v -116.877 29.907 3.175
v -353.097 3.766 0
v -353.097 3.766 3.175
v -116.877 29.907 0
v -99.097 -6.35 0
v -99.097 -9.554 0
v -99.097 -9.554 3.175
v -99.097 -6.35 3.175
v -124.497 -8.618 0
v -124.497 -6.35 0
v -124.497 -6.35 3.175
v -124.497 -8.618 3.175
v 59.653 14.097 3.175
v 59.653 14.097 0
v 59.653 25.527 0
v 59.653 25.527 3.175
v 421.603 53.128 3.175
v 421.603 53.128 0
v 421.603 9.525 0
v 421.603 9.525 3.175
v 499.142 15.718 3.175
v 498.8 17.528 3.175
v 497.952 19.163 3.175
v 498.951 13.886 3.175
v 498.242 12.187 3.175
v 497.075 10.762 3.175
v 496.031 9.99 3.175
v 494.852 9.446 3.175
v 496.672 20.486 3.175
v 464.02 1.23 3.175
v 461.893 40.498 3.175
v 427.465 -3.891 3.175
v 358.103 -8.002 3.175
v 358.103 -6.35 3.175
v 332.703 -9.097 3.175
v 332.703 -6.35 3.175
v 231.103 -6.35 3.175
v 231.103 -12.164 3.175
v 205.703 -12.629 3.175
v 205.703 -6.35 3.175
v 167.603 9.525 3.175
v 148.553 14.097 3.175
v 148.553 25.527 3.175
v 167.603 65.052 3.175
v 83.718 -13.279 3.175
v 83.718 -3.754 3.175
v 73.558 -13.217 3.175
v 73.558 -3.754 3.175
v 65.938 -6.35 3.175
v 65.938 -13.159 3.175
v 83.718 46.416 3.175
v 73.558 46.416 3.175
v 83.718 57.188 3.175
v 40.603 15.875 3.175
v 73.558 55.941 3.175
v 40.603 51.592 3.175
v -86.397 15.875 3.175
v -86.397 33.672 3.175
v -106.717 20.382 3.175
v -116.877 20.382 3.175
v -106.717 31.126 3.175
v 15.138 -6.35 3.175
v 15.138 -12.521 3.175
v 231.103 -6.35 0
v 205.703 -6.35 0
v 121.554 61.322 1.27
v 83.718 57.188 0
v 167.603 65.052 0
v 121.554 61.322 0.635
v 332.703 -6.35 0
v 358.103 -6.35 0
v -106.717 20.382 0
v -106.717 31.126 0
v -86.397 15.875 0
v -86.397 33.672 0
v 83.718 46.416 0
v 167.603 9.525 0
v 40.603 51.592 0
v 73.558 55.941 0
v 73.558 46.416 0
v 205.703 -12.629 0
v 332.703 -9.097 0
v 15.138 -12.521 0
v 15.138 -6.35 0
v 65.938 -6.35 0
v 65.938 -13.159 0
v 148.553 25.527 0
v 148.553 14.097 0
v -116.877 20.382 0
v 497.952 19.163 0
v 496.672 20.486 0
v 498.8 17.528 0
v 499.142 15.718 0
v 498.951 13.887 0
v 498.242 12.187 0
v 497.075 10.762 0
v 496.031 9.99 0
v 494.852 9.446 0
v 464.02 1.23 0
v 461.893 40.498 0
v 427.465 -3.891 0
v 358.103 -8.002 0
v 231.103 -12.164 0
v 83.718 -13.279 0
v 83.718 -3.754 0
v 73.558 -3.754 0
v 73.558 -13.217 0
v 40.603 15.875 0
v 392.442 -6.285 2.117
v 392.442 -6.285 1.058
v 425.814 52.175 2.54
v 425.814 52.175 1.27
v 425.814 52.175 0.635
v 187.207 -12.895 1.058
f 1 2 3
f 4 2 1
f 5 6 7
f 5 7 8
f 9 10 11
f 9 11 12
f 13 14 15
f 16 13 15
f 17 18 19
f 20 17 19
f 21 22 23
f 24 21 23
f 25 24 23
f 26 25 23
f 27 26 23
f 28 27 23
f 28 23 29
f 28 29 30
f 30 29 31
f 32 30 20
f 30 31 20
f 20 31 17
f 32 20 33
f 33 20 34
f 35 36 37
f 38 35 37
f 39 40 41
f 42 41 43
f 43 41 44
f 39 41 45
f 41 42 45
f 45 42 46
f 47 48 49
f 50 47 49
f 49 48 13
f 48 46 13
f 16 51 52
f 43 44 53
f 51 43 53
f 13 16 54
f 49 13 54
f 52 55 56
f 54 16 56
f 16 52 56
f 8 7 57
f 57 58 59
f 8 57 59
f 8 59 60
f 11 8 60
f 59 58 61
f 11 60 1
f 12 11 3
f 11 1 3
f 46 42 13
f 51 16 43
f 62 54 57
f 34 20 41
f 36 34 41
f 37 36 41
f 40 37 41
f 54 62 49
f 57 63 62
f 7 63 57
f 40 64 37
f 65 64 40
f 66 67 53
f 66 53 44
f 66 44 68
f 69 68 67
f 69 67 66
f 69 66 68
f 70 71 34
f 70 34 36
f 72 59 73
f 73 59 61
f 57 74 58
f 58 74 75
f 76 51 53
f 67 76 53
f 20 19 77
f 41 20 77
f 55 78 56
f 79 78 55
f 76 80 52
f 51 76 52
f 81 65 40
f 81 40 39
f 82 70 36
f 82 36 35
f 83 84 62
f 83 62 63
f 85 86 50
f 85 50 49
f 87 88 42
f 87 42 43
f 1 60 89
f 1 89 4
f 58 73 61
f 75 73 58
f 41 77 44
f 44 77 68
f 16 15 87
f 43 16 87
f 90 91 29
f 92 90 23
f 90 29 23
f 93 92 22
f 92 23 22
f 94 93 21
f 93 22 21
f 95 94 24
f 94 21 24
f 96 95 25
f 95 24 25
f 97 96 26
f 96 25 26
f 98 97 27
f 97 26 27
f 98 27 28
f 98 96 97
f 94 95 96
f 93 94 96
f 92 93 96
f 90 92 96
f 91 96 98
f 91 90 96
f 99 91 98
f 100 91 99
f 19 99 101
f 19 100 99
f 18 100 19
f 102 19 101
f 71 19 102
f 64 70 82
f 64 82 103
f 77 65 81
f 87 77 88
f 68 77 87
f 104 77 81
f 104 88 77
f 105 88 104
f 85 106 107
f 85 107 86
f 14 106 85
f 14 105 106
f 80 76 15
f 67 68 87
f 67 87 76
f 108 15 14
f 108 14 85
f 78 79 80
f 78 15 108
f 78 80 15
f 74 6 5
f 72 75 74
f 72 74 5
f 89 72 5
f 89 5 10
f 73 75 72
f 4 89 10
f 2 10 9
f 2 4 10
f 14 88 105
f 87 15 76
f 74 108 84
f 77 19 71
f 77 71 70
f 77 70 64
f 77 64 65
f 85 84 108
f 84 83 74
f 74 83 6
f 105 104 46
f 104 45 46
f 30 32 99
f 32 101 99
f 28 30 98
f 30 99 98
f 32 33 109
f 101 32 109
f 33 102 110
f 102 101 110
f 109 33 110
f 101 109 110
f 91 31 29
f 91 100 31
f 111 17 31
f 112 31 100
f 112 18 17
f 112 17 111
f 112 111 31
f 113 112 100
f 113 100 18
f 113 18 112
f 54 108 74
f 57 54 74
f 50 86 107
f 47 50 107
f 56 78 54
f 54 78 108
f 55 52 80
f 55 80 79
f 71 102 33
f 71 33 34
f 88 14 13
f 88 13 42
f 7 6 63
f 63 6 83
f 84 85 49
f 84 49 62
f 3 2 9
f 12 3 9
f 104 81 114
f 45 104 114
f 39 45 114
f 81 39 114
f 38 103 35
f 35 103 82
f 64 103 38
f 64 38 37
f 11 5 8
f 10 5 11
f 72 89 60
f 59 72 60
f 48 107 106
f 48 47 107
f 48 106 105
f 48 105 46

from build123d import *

# Parameters (mm, degrees)
BOSS_EXTRUDE1_DEPTH   = 3.175
FILLET1_R             = 6.35
CUT_EXTRUDE5_REACH    = 505.743
SKETCH5_W             = 88.9
SKETCH5_H             = 11.43
CUT_EXTRUDE3_DEPTH    = 5.08
CUT_EXTRUDE6_REACH    = 505.743
CUT_EXTRUDE4_DEPTH    = 5.08
CAVITY1_START         = -116.877115344
CAVITY1_OUTLINE_W     = 26.033160117
CAVITY1_OUTLINE_H     = 6
CAVITY1_DEPTH         = 10.16
CAVITY1_START_2       = 73.557724966
CAVITY1_2_OUTLINE_W   = 11.245727141
CAVITY1_2_OUTLINE_H   = 6
CAVITY1_2_OUTLINE_W_2 = 12.584380536
CAVITY1_2_DEPTH       = 10.16


# Read off the part's stored shape, not the designer's step: Cavity1
with BuildPart() as part:
    # Sketch1 → Boss-Extrude1 (new body)
    with BuildSketch(Plane.XY):
        with BuildLine():
            add(Edge.make_bspline(
                [(-353.097115344, 3.76640622), (-263.60988857, 15.489732087), (-103.405625954, 27.702523148), (139.625383809, 69.731889132), (320.600909148, 70.897971745), (447.029350736, 49.156772515), (484.461992977, 32.39779841), (505.225432444, 13.29140622)],
                knots=[0, 0, 0, 0, 0.308401543, 0.542913332, 0.850169973, 0.887176211, 1, 1, 1, 1], degree=3))
            add(Edge.make_bspline(
                [(-353.097115344, 3.76640622), (-171.204173065, -8.622681299), (70.681231732, -17.726989966), (367.634485174, -8.589262826), (467.934967897, -1.634661846), (505.225432444, 13.29140622)],
                knots=[0, 0, 0, 0, 0.625313044, 0.861778666, 1, 1, 1, 1], degree=3))
        make_face()
    extrude(amount=BOSS_EXTRUDE1_DEPTH)

    # Fillet1
    fillet1_edges = [part.edges().sort_by_distance(p)[0] for p in [
        (505.225432444, 13.29140622, 1.5875),
    ]]
    fillet(fillet1_edges, radius=FILLET1_R)

    # Sketch7 → Cut-Extrude5 (cut, up to next)
    with BuildSketch(Plane(origin=(0, 0, 0), x_dir=(-1, 0, 0), z_dir=(0, 0, -1)), mode=Mode.PRIVATE) as cut_extrude5_sk1:
        with BuildLine():
            Line((-358.102884656, -6.35), (-332.702884656, -6.35))
            Line((-332.702884656, -6.35), (-332.702884656, -9.096739879))
            add(Edge.make_bspline(
                [(-332.702884656, -9.096739879), (-341.216325131, -8.753253809), (-349.686543734, -8.388301604), (-358.102884656, -8.001631902)],
                knots=[0.79148957, 0.79148957, 0.79148957, 0.79148957, 0.821107867, 0.821107867, 0.821107867, 0.821107867], degree=3))
            Line((-358.102884656, -8.001631902), (-358.102884656, -6.35))
        make_face()
    cut_extrude5_tool1 = extrude(cut_extrude5_sk1.sketch, amount=-CUT_EXTRUDE5_REACH, mode=Mode.PRIVATE) & part.part
    # Sketch7 → Cut-Extrude5 (cut, up to next)
    with BuildSketch(Plane(origin=(0, 0, 0), x_dir=(-1, 0, 0), z_dir=(0, 0, -1)), mode=Mode.PRIVATE) as cut_extrude5_sk2:
        with BuildLine():
            Line((-231.102884656, -6.35), (-205.702884656, -6.35))
            Line((-205.702884656, -6.35), (-205.702884656, -12.629236372))
            add(Edge.make_bspline(
                [(-205.702884656, -12.629236372), (-214.16430095, -12.49359489), (-222.634256581, -12.338730353), (-231.102884656, -12.164410009)],
                knots=[0.646368105, 0.646368105, 0.646368105, 0.646368105, 0.675236637, 0.675236637, 0.675236637, 0.675236637], degree=3))
            Line((-231.102884656, -12.164410009), (-231.102884656, -6.35))
        make_face()
    cut_extrude5_tool2 = extrude(cut_extrude5_sk2.sketch, amount=-CUT_EXTRUDE5_REACH, mode=Mode.PRIVATE) & part.part
    # Sketch7 → Cut-Extrude5 (cut, up to next)
    with BuildSketch(Plane(origin=(0, 0, 0), x_dir=(-1, 0, 0), z_dir=(0, 0, -1)), mode=Mode.PRIVATE) as cut_extrude5_sk3:
        with BuildLine():
            Line((-65.93772502, -6.35), (-15.13772502, -6.35))
            Line((-15.13772502, -6.35), (-15.13772502, -12.521395898))
            add(Edge.make_bspline(
                [(-15.13772502, -12.521395898), (-32.040463908, -12.805124192), (-48.969973263, -13.018530998), (-65.93772502, -13.158984983)],
                knots=[0.427180219, 0.427180219, 0.427180219, 0.427180219, 0.48603051, 0.48603051, 0.48603051, 0.48603051], degree=3))
            Line((-65.93772502, -13.158984983), (-65.93772502, -6.35))
        make_face()
    cut_extrude5_tool3 = extrude(cut_extrude5_sk3.sketch, amount=-CUT_EXTRUDE5_REACH, mode=Mode.PRIVATE) & part.part
    # Sketch7 → Cut-Extrude5 (cut, up to next)
    with BuildSketch(Plane(origin=(0, 0, 0), x_dir=(-1, 0, 0), z_dir=(0, 0, -1)), mode=Mode.PRIVATE) as cut_extrude5_sk4:
        with BuildLine():
            Line((99.097115344, -6.35), (124.497115344, -6.35))
            Line((124.497115344, -6.35), (124.497115344, -8.618440951))
            add(Edge.make_bspline(
                [(124.497115344, -8.618440951), (116.029695194, -8.946223445), (107.563514441, -9.25806826), (99.097115344, -9.553641032)],
                knots=[0.264694306, 0.264694306, 0.264694306, 0.264694306, 0.294281016, 0.294281016, 0.294281016, 0.294281016], degree=3))
            Line((99.097115344, -9.553641032), (99.097115344, -6.35))
        make_face()
    cut_extrude5_tool4 = extrude(cut_extrude5_sk4.sketch, amount=-CUT_EXTRUDE5_REACH, mode=Mode.PRIVATE) & part.part
    add(cut_extrude5_tool1.solids().sort_by_distance((344.35466, -7.478114, 0))[0], mode=Mode.SUBTRACT)
    add(cut_extrude5_tool2.solids().sort_by_distance((218.240446, -9.379718, 0))[0], mode=Mode.SUBTRACT)
    add(cut_extrude5_tool3.solids().sort_by_distance((40.951434, -9.615723, 0))[0], mode=Mode.SUBTRACT)
    add(cut_extrude5_tool4.solids().sort_by_distance((-111.075712, -7.735326, 0))[0], mode=Mode.SUBTRACT)

    # Sketch5 → Cut-Extrude3 (cut)
    with BuildSketch(Plane.XY):
        with Locations((104.102884656, 19.812)):
            Rectangle(SKETCH5_W, SKETCH5_H)
    extrude(amount=CUT_EXTRUDE3_DEPTH, mode=Mode.SUBTRACT)

    # Sketch8 → Cut-Extrude6 (cut, up to next)
    with BuildSketch(Plane(origin=(0, 0, 0), x_dir=(-1, 0, 0), z_dir=(0, 0, -1)), mode=Mode.PRIVATE) as cut_extrude6_sk1:
        with BuildLine():
            Line((-421.602884656, 53.128136288), (-421.602884656, 9.525))
            Line((-421.602884656, 9.525), (-167.602884656, 9.525))
            Line((-167.602884656, 9.525), (-167.602884656, 65.051503813))
            add(Edge.make_bspline(
                [(-167.602884656, 65.051503813), (-244.722722107, 70.03272949), (-333.181087562, 68.488590043), (-412.953469478, 55.01226242), (-421.602884656, 53.128136288)],
                knots=[0.594152543, 0.594152543, 0.594152543, 0.594152543, 0.850169973, 0.88199459, 0.88199459, 0.88199459, 0.88199459], degree=3))
        make_face()
    cut_extrude6_tool1 = extrude(cut_extrude6_sk1.sketch, amount=-CUT_EXTRUDE6_REACH, mode=Mode.PRIVATE) & part.part
    add(cut_extrude6_tool1.solids().sort_by_distance((290.394323, 37.11831, 0))[0], mode=Mode.SUBTRACT)

    # Sketch6 → Cut-Extrude4 (cut)
    with BuildSketch(Plane.XY):
        with BuildLine():
            Line((40.602884656, 51.591569772), (40.602884656, 15.875))
            Line((40.602884656, 15.875), (-86.397115344, 15.875))
            Line((-86.397115344, 15.875), (-86.397115344, 33.671872302))
            add(Edge.make_bspline(
                [(-86.397115344, 33.671872302), (-85.336997309, 33.80875443), (-42.923565209, 39.312219047), (-0.873657075, 45.877823306), (40.602884656, 51.591569772)],
                knots=[0.304745552, 0.304745552, 0.304745552, 0.304745552, 0.308401543, 0.451045815, 0.451045815, 0.451045815, 0.451045815], degree=3))
        make_face()
    extrude(amount=CUT_EXTRUDE4_DEPTH, mode=Mode.SUBTRACT)

    # Cavity1 outline → Cavity1 (cut)
    with BuildSketch(Plane.YZ.offset(CAVITY1_START)):
        with Locations((33.399039406, 2)):
            Rectangle(CAVITY1_OUTLINE_W, CAVITY1_OUTLINE_H)
    extrude(amount=CAVITY1_DEPTH, mode=Mode.SUBTRACT)

    # Cavity1 2 outline → Cavity1 2 (cut)
    with BuildSketch(Plane.YZ.offset(CAVITY1_START_2)):
        with Locations((-9.37713643, 2)):
            Rectangle(CAVITY1_2_OUTLINE_W, CAVITY1_2_OUTLINE_H)
        with Locations((52.707809732, 2)):
            Rectangle(CAVITY1_2_OUTLINE_W_2, CAVITY1_2_OUTLINE_H)
    extrude(amount=CAVITY1_2_DEPTH, mode=Mode.SUBTRACT)


solid = part.part
